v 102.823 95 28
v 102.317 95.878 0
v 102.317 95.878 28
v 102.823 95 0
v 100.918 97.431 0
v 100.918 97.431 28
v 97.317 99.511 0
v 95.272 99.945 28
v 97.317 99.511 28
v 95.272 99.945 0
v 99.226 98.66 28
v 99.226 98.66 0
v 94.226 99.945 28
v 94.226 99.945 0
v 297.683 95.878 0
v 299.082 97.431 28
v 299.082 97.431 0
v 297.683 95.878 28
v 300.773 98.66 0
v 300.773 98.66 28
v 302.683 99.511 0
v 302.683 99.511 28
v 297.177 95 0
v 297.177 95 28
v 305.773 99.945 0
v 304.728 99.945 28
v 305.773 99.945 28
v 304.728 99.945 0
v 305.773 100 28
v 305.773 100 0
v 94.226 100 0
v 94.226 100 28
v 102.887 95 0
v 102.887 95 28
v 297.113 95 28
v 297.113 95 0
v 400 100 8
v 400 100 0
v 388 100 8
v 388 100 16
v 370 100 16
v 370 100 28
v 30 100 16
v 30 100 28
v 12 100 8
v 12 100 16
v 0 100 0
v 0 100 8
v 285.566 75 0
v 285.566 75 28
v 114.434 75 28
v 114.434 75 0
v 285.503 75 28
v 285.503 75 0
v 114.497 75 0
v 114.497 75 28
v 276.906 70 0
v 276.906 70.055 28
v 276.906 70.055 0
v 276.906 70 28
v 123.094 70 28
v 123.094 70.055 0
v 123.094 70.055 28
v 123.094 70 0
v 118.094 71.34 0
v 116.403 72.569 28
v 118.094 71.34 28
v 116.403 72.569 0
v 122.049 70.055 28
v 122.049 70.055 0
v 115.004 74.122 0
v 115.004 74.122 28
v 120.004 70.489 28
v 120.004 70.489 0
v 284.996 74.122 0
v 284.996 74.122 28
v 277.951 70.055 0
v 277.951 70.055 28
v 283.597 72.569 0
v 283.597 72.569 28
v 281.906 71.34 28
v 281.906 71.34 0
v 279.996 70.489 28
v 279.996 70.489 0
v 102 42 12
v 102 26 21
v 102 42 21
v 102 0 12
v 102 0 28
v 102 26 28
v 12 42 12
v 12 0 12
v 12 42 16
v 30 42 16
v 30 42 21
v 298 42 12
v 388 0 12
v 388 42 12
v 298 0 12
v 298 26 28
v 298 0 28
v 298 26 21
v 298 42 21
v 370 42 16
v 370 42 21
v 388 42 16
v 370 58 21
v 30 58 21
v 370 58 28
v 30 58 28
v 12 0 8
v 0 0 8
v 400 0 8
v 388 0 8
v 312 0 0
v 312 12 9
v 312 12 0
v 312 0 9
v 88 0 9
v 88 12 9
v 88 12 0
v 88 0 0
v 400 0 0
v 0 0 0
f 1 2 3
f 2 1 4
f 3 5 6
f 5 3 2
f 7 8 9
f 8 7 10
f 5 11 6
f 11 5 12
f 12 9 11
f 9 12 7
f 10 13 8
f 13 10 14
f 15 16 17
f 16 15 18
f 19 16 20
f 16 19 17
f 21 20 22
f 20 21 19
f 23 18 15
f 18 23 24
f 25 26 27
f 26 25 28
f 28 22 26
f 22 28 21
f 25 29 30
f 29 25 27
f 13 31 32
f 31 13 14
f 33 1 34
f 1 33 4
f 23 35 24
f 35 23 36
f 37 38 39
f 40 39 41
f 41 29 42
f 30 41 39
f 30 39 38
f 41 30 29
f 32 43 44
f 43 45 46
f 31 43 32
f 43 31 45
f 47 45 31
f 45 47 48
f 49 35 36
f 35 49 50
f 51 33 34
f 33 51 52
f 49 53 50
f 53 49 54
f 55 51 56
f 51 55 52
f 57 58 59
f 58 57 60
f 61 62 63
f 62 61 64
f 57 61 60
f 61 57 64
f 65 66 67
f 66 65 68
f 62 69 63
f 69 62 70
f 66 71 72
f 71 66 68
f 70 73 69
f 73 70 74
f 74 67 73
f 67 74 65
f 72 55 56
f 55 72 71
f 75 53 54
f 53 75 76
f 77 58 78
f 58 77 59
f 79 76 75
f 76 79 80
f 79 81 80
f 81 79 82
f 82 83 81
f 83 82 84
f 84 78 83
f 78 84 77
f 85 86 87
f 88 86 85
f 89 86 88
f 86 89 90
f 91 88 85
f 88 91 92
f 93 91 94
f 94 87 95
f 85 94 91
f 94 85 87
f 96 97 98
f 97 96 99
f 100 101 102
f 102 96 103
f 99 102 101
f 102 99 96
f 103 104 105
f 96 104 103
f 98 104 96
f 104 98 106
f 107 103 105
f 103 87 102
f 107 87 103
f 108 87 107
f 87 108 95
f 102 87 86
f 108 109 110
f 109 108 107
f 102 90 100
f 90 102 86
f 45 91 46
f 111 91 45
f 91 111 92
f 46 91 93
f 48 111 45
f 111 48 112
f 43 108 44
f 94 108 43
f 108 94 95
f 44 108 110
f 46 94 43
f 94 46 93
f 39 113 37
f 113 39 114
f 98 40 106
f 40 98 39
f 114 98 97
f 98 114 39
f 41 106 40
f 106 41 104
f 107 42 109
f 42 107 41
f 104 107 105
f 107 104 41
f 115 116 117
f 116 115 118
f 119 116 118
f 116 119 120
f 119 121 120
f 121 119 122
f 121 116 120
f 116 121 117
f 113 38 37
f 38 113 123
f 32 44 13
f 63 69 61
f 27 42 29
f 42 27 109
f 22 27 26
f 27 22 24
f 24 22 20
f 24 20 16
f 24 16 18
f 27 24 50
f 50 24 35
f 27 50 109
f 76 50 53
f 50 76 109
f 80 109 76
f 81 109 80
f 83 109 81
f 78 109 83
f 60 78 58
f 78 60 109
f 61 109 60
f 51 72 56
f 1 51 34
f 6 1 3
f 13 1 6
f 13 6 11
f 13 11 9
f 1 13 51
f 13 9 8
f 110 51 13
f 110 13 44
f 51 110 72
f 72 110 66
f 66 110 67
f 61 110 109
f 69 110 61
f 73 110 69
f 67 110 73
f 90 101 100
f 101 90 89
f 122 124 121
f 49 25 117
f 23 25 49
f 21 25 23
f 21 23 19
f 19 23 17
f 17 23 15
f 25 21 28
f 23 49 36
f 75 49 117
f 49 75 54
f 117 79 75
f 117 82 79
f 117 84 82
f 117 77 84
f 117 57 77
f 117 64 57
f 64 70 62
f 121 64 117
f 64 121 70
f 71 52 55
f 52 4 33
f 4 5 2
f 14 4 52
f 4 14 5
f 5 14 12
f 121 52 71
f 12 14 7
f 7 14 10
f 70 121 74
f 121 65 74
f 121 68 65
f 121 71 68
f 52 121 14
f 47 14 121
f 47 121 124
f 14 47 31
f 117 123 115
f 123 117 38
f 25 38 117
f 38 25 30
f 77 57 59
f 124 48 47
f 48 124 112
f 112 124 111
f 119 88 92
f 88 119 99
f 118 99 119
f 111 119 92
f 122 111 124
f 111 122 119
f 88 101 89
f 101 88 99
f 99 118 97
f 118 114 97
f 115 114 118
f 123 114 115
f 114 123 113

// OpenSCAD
include <../src/wardrobe.scad>;
plank_xz_rear_bottom(wardrobe_n);
//github_openscad -o wardrobe_2/plank_xz_rear_bottom.stl -D wardrobe_n=2 -D cutting_edge=0 -D break_view_length=0 wardrobe_2/plank_xz_rear_bottom_stl.scad
